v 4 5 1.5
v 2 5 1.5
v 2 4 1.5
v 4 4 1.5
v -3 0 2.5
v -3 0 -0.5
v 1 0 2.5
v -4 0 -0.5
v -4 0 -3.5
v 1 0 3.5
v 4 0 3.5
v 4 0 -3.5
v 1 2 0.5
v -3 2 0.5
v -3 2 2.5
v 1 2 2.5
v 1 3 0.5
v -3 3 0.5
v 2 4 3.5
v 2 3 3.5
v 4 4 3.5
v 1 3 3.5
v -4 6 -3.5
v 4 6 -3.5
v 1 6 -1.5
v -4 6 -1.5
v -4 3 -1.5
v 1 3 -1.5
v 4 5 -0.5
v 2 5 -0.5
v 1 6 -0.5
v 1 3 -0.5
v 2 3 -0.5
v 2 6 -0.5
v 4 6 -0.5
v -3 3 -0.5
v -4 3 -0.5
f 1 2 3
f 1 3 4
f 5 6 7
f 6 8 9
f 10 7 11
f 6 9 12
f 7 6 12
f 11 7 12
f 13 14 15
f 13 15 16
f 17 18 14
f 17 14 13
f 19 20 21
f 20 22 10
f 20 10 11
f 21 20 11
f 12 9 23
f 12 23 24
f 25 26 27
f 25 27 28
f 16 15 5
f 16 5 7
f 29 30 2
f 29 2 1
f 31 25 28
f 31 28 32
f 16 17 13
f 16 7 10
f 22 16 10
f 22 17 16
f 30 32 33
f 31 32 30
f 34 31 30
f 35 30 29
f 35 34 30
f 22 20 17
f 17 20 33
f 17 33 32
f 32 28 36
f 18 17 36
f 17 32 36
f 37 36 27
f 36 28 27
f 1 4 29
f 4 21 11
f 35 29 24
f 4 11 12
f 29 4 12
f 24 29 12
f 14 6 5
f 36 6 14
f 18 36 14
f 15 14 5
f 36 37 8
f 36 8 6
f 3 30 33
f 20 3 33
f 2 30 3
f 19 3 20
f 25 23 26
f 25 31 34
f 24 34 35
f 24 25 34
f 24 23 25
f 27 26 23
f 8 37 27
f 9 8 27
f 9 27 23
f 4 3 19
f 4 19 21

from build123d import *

# Parameters (mm, degrees)
SKETCH1_W           = 8
SKETCH1_H           = 7
BOSS_EXTRUDE1_DEPTH = 6
CUT_EXTRUDE1_DEPTH  = 60
CUT_EXTRUDE2_DEPTH  = 3
SKETCH5_W           = 4
SKETCH5_H           = 2
CUT_EXTRUDE3_DEPTH  = 1
SKETCH6_W           = 3.001059972
SKETCH6_H           = 4.860975679
CUT_EXTRUDE4_DEPTH  = 1
SKETCH7_W           = 2
SKETCH7_H           = 2
CUT_EXTRUDE5_DEPTH  = 1


with BuildPart() as part:
    # Sketch1 → Boss-Extrude1 (new body)
    with BuildSketch(Plane(origin=(0, 0, 0), x_dir=(1, 0, 0), z_dir=(0, 1, 0))):
        Rectangle(SKETCH1_W, SKETCH1_H)
    extrude(amount=BOSS_EXTRUDE1_DEPTH)

    # Sketch2 → Cut-Extrude1 (cut)
    with BuildSketch(Plane(origin=(0, 6, 0), x_dir=(1, 0, 0), z_dir=(0, 1, 0))):
        Polygon((-4, 0.5), (-3, 0.5), (-3, -2.5), (1, -2.5), (1, -3.5), (-4, -3.5), align=None)
    extrude(amount=-CUT_EXTRUDE1_DEPTH, mode=Mode.SUBTRACT)

    # Sketch4 → Cut-Extrude2 (cut)
    with BuildSketch(Plane(origin=(0, 6, 0), x_dir=(1, 0, 0), z_dir=(0, 1, 0))):
        Polygon((-4, 1.5), (1, 1.5), (1, 0.5), (2, 0.5), (2, -4.455907127), (-4, -3.689508324), align=None)
    extrude(amount=-CUT_EXTRUDE2_DEPTH, mode=Mode.SUBTRACT)

    # Sketch5 → Cut-Extrude3 (cut)
    with BuildSketch(Plane(origin=(0, 3, 0), x_dir=(1, 0, 0), z_dir=(0, 1, 0))):
        with Locations((-1, -1.5)):
            Rectangle(SKETCH5_W, SKETCH5_H)
    extrude(amount=-CUT_EXTRUDE3_DEPTH, mode=Mode.SUBTRACT)

    # Sketch6 → Cut-Extrude4 (cut)
    with BuildSketch(Plane(origin=(0, 6, 0), x_dir=(1, 0, 0), z_dir=(0, 1, 0))):
        with Locations((3.500529986, -1.93048784)):
            Rectangle(SKETCH6_W, SKETCH6_H)
    extrude(amount=-CUT_EXTRUDE4_DEPTH, mode=Mode.SUBTRACT)

    # Sketch7 → Cut-Extrude5 (cut)
    with BuildSketch(Plane(origin=(0, 5, 0), x_dir=(1, 0, 0), z_dir=(0, 1, 0))):
        with Locations((3, -2.5)):
            Rectangle(SKETCH7_W, SKETCH7_H)
    extrude(amount=-CUT_EXTRUDE5_DEPTH, mode=Mode.SUBTRACT)


solid = part.part
